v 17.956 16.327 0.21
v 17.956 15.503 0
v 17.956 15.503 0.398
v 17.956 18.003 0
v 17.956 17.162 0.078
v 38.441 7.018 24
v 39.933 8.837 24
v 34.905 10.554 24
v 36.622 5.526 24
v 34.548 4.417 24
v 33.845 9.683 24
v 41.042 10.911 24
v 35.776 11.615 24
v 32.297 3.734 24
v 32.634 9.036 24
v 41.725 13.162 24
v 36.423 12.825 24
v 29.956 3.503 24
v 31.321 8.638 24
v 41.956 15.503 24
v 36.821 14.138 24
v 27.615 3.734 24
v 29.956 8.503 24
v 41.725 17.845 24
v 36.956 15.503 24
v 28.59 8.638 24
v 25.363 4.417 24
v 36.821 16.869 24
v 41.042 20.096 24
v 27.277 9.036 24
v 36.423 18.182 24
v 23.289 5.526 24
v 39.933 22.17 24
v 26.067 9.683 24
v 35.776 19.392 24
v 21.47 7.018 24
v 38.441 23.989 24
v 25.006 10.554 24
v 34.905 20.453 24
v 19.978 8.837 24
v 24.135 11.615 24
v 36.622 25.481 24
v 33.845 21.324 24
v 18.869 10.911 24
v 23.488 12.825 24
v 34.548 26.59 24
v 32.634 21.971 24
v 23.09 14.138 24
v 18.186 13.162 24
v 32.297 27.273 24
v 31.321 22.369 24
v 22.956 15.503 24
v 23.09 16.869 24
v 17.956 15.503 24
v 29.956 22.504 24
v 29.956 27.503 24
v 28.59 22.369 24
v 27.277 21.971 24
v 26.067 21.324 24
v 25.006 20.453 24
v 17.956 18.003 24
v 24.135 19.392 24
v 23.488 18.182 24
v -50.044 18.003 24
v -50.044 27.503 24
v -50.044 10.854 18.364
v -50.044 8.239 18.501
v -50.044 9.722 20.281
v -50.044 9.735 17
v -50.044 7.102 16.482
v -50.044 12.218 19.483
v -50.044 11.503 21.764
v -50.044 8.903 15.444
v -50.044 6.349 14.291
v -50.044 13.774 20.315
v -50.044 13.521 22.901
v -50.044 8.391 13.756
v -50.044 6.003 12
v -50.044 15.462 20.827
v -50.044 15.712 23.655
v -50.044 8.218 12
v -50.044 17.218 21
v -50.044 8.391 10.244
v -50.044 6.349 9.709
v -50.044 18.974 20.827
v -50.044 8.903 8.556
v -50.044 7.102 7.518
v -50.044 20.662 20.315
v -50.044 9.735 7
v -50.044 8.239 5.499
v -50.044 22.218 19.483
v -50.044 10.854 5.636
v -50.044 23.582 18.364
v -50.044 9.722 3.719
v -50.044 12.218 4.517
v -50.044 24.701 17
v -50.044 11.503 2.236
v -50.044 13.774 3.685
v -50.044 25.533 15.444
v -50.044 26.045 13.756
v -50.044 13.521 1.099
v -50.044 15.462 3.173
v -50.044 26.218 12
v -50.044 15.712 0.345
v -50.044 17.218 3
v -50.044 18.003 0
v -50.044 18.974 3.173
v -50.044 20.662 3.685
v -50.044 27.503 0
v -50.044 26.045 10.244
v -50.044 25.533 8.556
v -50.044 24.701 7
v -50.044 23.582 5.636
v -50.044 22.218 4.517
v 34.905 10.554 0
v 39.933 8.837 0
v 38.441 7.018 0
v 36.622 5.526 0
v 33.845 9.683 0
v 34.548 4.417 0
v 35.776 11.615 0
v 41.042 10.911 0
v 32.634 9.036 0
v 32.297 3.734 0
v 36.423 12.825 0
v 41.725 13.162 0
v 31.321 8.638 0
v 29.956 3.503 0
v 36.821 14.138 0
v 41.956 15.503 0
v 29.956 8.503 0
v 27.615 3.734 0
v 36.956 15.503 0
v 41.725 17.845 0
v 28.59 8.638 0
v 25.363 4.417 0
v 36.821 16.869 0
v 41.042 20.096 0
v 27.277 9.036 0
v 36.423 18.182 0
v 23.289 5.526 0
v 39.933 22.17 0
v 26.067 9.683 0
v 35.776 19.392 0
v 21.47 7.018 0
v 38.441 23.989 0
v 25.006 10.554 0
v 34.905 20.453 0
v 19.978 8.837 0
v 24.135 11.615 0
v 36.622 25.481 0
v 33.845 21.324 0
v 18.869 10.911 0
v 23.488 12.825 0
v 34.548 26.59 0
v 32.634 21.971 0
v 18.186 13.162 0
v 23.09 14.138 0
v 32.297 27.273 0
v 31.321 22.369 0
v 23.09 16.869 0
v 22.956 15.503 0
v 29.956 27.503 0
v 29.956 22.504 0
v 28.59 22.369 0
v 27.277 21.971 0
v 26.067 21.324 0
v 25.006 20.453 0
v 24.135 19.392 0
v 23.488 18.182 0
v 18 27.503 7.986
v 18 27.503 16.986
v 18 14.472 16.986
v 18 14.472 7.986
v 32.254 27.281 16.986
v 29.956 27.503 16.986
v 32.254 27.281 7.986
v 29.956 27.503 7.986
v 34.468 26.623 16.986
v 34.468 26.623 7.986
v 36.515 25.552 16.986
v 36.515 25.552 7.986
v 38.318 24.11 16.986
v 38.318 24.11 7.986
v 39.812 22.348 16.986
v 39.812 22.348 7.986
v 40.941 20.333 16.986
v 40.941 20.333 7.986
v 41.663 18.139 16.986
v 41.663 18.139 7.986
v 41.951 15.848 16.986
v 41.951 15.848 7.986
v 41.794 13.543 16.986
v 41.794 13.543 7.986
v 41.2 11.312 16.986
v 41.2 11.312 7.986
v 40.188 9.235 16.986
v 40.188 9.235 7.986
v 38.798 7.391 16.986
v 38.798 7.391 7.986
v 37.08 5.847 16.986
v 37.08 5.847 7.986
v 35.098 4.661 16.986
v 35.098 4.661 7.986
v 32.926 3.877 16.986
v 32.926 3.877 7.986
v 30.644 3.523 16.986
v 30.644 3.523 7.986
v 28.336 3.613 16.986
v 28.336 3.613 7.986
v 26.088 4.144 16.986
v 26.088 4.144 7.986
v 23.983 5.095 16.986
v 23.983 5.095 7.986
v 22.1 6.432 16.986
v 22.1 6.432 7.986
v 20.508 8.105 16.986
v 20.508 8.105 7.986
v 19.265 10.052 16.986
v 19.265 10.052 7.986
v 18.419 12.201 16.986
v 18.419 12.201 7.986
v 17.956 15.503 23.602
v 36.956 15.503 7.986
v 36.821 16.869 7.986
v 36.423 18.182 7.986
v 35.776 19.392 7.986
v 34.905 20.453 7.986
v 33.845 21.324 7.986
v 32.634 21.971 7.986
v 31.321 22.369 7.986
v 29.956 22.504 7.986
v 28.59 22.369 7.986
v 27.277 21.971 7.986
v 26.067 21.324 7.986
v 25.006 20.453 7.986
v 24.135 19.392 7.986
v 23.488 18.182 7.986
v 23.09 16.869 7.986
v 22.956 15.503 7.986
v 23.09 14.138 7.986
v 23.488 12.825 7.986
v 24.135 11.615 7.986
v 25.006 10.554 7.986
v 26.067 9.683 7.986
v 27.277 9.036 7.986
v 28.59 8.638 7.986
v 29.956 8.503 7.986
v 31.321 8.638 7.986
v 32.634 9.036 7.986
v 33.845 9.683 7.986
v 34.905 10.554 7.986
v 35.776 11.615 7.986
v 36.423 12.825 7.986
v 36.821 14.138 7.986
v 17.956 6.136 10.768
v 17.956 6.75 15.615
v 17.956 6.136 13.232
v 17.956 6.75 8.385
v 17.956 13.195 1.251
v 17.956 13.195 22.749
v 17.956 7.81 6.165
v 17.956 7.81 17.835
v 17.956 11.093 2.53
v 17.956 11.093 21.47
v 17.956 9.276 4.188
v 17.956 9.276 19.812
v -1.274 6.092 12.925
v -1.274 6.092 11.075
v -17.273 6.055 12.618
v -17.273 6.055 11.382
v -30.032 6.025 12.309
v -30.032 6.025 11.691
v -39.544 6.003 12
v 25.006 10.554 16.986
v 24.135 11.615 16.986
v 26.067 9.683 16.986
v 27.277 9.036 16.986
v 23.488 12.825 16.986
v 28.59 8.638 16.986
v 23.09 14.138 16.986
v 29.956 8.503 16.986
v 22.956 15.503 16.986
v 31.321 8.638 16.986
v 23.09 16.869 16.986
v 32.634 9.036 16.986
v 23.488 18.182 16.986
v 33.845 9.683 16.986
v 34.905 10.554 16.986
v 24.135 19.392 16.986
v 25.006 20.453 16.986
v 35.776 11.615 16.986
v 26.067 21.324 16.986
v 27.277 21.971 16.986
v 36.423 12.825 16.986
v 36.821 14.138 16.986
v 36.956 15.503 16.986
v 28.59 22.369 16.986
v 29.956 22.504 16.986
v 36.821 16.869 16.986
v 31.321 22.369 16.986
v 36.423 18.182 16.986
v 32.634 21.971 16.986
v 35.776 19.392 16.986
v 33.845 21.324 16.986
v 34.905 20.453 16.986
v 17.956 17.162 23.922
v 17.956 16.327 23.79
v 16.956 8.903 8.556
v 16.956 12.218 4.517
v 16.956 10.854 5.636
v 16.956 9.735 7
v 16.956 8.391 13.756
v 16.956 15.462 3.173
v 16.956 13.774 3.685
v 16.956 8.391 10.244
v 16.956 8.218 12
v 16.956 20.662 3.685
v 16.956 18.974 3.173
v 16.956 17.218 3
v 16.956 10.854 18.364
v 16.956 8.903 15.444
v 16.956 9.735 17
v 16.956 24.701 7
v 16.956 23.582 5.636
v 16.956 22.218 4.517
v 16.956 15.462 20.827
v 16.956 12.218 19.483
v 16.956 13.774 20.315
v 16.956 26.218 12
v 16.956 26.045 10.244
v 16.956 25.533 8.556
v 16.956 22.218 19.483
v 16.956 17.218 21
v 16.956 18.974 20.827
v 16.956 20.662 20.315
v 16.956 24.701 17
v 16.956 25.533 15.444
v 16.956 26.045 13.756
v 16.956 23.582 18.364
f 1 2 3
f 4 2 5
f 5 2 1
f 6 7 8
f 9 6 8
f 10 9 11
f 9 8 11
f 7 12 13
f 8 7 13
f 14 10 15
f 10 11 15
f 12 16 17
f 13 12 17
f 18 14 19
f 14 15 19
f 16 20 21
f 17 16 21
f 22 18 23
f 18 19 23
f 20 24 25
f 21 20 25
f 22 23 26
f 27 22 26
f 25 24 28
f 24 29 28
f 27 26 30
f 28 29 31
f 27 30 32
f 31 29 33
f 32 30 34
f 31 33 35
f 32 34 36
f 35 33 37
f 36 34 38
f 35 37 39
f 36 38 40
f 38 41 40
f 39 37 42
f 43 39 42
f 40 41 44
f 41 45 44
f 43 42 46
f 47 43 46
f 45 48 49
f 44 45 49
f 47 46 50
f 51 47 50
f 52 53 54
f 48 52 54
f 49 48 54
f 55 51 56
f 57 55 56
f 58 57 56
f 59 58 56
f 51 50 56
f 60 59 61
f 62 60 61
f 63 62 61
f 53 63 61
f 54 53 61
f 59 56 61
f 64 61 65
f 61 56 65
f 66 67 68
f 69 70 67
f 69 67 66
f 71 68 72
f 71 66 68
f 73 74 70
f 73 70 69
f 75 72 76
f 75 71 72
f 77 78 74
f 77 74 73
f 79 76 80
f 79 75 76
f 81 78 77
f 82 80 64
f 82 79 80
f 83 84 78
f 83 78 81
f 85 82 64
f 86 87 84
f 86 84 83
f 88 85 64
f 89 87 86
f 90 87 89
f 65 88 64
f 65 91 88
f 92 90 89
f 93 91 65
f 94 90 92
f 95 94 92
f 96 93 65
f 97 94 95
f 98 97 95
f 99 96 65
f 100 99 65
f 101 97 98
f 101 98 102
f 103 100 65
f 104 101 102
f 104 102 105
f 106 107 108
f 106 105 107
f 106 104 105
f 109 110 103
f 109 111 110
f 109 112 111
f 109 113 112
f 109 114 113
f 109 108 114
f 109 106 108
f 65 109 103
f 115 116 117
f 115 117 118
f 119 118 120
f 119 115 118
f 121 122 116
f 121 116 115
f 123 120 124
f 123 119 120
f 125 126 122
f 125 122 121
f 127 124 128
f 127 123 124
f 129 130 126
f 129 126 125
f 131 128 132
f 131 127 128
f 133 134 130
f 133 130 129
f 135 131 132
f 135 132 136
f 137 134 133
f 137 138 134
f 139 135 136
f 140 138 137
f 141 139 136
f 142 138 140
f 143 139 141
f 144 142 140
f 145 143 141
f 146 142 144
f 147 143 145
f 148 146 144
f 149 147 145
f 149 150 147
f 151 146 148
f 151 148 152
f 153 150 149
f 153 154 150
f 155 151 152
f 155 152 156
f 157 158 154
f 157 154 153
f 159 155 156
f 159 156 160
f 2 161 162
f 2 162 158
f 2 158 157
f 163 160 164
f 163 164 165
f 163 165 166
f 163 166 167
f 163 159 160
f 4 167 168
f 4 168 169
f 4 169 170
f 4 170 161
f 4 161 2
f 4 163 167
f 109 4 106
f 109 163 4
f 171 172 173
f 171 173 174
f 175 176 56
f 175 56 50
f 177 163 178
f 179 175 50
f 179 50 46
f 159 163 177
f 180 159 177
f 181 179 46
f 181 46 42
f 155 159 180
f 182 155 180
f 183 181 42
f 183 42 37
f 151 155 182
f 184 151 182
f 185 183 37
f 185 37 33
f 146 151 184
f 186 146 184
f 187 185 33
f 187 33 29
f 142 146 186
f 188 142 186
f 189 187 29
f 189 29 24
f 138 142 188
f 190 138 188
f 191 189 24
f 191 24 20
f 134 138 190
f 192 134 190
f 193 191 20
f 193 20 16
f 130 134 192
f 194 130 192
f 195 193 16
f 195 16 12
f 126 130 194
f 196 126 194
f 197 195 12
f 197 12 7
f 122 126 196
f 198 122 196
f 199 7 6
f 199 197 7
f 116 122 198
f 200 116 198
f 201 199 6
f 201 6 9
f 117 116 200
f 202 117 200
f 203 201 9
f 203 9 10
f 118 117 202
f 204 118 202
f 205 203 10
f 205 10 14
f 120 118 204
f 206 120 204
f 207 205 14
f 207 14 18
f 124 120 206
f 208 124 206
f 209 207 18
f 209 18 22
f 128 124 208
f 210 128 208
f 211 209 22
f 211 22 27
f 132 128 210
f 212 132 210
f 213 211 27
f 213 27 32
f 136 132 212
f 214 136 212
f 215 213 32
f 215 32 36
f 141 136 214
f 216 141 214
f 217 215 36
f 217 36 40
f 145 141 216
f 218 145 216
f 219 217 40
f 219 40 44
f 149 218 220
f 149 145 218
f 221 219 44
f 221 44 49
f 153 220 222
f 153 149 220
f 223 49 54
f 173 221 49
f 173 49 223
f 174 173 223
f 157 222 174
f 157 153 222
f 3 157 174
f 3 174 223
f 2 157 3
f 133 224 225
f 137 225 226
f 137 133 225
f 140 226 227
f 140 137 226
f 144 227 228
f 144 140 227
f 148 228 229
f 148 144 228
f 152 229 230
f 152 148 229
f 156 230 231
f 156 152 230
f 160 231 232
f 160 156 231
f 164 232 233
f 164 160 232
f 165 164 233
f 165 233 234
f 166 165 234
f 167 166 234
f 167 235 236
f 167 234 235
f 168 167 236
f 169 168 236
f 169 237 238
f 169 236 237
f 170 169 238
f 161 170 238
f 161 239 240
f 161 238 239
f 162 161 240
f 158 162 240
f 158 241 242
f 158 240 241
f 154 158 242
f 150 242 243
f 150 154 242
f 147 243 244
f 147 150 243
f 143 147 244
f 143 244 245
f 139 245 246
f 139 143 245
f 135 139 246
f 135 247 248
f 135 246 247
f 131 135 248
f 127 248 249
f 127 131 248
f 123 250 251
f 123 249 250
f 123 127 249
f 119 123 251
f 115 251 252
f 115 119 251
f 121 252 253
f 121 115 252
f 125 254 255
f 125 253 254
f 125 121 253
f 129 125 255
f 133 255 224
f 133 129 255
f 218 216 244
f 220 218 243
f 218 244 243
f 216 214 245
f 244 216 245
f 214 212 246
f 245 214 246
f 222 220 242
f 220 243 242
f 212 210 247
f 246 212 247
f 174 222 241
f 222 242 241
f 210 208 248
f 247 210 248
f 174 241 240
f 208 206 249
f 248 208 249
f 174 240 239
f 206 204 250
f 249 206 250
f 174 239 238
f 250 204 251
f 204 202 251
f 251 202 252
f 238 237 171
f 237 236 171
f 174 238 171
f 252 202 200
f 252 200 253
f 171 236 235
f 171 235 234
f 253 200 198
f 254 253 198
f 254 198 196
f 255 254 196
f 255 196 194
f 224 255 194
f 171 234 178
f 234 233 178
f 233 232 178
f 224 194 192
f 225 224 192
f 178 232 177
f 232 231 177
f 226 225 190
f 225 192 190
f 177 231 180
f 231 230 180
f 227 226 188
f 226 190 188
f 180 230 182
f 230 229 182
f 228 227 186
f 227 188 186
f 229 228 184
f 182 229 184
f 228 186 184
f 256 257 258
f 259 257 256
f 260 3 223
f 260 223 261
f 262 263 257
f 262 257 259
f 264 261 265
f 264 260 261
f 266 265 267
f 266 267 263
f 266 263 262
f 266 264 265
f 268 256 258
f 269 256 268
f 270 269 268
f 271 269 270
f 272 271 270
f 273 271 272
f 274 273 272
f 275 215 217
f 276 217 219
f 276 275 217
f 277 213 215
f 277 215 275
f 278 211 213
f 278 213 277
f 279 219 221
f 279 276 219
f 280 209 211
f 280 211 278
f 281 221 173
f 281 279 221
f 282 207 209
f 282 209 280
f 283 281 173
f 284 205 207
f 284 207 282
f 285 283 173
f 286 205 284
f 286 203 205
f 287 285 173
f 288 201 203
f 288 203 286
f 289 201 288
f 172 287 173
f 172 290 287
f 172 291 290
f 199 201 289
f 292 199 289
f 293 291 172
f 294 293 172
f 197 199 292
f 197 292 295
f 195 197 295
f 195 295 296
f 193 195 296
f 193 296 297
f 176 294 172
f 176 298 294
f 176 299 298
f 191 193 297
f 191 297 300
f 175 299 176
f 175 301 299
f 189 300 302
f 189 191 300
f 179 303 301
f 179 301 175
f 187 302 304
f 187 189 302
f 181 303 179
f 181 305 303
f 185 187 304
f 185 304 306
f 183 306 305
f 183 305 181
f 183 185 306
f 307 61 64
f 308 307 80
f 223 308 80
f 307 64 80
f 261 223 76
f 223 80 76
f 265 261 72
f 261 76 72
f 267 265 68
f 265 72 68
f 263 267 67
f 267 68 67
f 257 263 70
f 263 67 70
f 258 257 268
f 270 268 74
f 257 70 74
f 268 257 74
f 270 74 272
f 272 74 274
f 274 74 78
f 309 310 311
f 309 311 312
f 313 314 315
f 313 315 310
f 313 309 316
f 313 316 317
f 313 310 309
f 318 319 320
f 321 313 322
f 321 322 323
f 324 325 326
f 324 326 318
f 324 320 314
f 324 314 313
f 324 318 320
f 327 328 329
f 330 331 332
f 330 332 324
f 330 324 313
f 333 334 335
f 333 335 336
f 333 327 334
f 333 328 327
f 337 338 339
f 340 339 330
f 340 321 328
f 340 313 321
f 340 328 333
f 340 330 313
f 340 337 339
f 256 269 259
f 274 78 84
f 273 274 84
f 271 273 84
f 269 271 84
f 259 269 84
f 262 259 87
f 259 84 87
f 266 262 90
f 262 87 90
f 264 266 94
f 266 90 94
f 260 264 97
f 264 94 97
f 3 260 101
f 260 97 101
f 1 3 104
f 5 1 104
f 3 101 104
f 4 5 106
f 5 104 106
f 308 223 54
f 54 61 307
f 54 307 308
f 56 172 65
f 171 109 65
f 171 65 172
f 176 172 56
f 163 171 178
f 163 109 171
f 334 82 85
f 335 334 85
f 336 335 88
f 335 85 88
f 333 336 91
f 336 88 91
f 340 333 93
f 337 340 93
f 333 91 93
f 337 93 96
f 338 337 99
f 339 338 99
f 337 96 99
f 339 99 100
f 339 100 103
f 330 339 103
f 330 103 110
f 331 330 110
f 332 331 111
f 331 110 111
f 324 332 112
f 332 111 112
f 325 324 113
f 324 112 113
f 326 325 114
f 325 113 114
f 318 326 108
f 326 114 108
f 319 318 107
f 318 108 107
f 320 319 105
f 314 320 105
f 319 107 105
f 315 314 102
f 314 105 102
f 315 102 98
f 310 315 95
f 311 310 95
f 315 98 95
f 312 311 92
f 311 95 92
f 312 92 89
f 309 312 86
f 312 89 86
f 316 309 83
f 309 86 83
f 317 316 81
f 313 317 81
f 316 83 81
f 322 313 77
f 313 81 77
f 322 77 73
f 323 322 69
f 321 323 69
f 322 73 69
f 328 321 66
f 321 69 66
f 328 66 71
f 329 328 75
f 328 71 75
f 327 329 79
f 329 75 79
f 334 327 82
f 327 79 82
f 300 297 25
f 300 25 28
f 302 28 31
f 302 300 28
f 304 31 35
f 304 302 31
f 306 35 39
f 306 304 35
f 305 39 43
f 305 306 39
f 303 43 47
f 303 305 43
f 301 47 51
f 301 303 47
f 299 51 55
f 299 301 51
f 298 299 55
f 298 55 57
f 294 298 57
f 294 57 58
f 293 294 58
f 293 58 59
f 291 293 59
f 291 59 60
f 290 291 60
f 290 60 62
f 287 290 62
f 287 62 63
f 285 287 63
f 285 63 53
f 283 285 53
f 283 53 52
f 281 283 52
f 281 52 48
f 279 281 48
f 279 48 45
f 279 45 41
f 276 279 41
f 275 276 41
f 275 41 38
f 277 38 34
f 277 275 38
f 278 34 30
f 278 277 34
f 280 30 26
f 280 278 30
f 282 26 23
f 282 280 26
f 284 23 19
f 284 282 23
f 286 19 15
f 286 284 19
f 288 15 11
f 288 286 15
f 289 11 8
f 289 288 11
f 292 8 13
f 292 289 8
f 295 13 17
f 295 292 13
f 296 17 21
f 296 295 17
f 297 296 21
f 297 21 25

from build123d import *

# Parameters (mm, degrees)
SKETCH1_R           = 7.00000696
BOSS_EXTRUDE1_DEPTH = 24
SKETCH2_W           = 9
SKETCH2_H           = 24
CUT_EXTRUDE1_DEPTH  = 32
SKETCH3_OUTSIDE_W   = 45.612
SKETCH3_OUTSIDE_H   = 45.612
CUT_EXTRUDE3_DEPTH  = 68
SKETCH4_R           = 9
CUT_EXTRUDE4_DEPTH  = 67


with BuildPart() as part:
    # Sketch1 → Boss-Extrude1 (new body)
    with BuildSketch(Plane.XY):
        with BuildLine():
            Line((-50.044390832, 27.503498209), (29.955609168, 27.503498209))
            ThreePointArc((29.955609168, 27.503498209), (38.440890542, 7.018216834), (17.955609168, 15.503498209))
            Line((17.955609168, 15.503498209), (17.955609168, 6.136182916))
            Line((17.955609168, 6.136182916), (-39.544390832, 6.003498209))
            Line((-39.544390832, 6.003498209), (-39.544390832, 5.015222645))
            Line((-39.544390832, 5.015222645), (-48.572054411, 5.015222645))
            Line((-48.572054411, 5.015222645), (-48.572054411, 6.003498173))
            Line((-48.572054411, 6.003498173), (-50.044390832, 6.003498173))
            Line((-50.044390832, 6.003498173), (-50.044390832, 27.503498209))
        make_face()
        with Locations((29.955609168, 15.503498209)):
            Circle(SKETCH1_R, mode=Mode.SUBTRACT)
    extrude(amount=BOSS_EXTRUDE1_DEPTH)

    # Sketch2 → Cut-Extrude1 (cut)
    with BuildSketch(Plane(origin=(50, 0, 0), x_dir=(0, 0, -1), z_dir=(1, 0, 0))):
        with Locations((-12.486255169, 15.503498209)):
            Rectangle(SKETCH2_W, SKETCH2_H)
    extrude(amount=-CUT_EXTRUDE1_DEPTH, mode=Mode.SUBTRACT)

    # Sketch3 outside → Cut-Extrude3 (cut)
    with BuildSketch(Plane.ZY.offset(50.044390832)):
        with Locations((12, 15.503)):
            Rectangle(SKETCH3_OUTSIDE_W, SKETCH3_OUTSIDE_H)
        with BuildLine():
            Line((0, 27.503498209), (24, 27.503498209))
            Line((24, 27.503498209), (24, 19.503498209))
            ThreePointArc((24, 19.503498209), (20.795941553, 10.268216816), (12, 6.003498173))
            ThreePointArc((12, 6.003498173), (3.204058447, 10.268216816), (0, 19.503498209))
            Line((0, 19.503498209), (0, 27.503498209))
        make_face(mode=Mode.SUBTRACT)
    extrude(amount=-CUT_EXTRUDE3_DEPTH, mode=Mode.SUBTRACT)

    # Sketch4 → Cut-Extrude4 (cut)
    with BuildSketch(Plane.ZY.offset(50.044390832)):
        with Locations((12, 17.218107651)):
            Circle(SKETCH4_R)
    extrude(amount=-CUT_EXTRUDE4_DEPTH, mode=Mode.SUBTRACT)


solid = part.part
